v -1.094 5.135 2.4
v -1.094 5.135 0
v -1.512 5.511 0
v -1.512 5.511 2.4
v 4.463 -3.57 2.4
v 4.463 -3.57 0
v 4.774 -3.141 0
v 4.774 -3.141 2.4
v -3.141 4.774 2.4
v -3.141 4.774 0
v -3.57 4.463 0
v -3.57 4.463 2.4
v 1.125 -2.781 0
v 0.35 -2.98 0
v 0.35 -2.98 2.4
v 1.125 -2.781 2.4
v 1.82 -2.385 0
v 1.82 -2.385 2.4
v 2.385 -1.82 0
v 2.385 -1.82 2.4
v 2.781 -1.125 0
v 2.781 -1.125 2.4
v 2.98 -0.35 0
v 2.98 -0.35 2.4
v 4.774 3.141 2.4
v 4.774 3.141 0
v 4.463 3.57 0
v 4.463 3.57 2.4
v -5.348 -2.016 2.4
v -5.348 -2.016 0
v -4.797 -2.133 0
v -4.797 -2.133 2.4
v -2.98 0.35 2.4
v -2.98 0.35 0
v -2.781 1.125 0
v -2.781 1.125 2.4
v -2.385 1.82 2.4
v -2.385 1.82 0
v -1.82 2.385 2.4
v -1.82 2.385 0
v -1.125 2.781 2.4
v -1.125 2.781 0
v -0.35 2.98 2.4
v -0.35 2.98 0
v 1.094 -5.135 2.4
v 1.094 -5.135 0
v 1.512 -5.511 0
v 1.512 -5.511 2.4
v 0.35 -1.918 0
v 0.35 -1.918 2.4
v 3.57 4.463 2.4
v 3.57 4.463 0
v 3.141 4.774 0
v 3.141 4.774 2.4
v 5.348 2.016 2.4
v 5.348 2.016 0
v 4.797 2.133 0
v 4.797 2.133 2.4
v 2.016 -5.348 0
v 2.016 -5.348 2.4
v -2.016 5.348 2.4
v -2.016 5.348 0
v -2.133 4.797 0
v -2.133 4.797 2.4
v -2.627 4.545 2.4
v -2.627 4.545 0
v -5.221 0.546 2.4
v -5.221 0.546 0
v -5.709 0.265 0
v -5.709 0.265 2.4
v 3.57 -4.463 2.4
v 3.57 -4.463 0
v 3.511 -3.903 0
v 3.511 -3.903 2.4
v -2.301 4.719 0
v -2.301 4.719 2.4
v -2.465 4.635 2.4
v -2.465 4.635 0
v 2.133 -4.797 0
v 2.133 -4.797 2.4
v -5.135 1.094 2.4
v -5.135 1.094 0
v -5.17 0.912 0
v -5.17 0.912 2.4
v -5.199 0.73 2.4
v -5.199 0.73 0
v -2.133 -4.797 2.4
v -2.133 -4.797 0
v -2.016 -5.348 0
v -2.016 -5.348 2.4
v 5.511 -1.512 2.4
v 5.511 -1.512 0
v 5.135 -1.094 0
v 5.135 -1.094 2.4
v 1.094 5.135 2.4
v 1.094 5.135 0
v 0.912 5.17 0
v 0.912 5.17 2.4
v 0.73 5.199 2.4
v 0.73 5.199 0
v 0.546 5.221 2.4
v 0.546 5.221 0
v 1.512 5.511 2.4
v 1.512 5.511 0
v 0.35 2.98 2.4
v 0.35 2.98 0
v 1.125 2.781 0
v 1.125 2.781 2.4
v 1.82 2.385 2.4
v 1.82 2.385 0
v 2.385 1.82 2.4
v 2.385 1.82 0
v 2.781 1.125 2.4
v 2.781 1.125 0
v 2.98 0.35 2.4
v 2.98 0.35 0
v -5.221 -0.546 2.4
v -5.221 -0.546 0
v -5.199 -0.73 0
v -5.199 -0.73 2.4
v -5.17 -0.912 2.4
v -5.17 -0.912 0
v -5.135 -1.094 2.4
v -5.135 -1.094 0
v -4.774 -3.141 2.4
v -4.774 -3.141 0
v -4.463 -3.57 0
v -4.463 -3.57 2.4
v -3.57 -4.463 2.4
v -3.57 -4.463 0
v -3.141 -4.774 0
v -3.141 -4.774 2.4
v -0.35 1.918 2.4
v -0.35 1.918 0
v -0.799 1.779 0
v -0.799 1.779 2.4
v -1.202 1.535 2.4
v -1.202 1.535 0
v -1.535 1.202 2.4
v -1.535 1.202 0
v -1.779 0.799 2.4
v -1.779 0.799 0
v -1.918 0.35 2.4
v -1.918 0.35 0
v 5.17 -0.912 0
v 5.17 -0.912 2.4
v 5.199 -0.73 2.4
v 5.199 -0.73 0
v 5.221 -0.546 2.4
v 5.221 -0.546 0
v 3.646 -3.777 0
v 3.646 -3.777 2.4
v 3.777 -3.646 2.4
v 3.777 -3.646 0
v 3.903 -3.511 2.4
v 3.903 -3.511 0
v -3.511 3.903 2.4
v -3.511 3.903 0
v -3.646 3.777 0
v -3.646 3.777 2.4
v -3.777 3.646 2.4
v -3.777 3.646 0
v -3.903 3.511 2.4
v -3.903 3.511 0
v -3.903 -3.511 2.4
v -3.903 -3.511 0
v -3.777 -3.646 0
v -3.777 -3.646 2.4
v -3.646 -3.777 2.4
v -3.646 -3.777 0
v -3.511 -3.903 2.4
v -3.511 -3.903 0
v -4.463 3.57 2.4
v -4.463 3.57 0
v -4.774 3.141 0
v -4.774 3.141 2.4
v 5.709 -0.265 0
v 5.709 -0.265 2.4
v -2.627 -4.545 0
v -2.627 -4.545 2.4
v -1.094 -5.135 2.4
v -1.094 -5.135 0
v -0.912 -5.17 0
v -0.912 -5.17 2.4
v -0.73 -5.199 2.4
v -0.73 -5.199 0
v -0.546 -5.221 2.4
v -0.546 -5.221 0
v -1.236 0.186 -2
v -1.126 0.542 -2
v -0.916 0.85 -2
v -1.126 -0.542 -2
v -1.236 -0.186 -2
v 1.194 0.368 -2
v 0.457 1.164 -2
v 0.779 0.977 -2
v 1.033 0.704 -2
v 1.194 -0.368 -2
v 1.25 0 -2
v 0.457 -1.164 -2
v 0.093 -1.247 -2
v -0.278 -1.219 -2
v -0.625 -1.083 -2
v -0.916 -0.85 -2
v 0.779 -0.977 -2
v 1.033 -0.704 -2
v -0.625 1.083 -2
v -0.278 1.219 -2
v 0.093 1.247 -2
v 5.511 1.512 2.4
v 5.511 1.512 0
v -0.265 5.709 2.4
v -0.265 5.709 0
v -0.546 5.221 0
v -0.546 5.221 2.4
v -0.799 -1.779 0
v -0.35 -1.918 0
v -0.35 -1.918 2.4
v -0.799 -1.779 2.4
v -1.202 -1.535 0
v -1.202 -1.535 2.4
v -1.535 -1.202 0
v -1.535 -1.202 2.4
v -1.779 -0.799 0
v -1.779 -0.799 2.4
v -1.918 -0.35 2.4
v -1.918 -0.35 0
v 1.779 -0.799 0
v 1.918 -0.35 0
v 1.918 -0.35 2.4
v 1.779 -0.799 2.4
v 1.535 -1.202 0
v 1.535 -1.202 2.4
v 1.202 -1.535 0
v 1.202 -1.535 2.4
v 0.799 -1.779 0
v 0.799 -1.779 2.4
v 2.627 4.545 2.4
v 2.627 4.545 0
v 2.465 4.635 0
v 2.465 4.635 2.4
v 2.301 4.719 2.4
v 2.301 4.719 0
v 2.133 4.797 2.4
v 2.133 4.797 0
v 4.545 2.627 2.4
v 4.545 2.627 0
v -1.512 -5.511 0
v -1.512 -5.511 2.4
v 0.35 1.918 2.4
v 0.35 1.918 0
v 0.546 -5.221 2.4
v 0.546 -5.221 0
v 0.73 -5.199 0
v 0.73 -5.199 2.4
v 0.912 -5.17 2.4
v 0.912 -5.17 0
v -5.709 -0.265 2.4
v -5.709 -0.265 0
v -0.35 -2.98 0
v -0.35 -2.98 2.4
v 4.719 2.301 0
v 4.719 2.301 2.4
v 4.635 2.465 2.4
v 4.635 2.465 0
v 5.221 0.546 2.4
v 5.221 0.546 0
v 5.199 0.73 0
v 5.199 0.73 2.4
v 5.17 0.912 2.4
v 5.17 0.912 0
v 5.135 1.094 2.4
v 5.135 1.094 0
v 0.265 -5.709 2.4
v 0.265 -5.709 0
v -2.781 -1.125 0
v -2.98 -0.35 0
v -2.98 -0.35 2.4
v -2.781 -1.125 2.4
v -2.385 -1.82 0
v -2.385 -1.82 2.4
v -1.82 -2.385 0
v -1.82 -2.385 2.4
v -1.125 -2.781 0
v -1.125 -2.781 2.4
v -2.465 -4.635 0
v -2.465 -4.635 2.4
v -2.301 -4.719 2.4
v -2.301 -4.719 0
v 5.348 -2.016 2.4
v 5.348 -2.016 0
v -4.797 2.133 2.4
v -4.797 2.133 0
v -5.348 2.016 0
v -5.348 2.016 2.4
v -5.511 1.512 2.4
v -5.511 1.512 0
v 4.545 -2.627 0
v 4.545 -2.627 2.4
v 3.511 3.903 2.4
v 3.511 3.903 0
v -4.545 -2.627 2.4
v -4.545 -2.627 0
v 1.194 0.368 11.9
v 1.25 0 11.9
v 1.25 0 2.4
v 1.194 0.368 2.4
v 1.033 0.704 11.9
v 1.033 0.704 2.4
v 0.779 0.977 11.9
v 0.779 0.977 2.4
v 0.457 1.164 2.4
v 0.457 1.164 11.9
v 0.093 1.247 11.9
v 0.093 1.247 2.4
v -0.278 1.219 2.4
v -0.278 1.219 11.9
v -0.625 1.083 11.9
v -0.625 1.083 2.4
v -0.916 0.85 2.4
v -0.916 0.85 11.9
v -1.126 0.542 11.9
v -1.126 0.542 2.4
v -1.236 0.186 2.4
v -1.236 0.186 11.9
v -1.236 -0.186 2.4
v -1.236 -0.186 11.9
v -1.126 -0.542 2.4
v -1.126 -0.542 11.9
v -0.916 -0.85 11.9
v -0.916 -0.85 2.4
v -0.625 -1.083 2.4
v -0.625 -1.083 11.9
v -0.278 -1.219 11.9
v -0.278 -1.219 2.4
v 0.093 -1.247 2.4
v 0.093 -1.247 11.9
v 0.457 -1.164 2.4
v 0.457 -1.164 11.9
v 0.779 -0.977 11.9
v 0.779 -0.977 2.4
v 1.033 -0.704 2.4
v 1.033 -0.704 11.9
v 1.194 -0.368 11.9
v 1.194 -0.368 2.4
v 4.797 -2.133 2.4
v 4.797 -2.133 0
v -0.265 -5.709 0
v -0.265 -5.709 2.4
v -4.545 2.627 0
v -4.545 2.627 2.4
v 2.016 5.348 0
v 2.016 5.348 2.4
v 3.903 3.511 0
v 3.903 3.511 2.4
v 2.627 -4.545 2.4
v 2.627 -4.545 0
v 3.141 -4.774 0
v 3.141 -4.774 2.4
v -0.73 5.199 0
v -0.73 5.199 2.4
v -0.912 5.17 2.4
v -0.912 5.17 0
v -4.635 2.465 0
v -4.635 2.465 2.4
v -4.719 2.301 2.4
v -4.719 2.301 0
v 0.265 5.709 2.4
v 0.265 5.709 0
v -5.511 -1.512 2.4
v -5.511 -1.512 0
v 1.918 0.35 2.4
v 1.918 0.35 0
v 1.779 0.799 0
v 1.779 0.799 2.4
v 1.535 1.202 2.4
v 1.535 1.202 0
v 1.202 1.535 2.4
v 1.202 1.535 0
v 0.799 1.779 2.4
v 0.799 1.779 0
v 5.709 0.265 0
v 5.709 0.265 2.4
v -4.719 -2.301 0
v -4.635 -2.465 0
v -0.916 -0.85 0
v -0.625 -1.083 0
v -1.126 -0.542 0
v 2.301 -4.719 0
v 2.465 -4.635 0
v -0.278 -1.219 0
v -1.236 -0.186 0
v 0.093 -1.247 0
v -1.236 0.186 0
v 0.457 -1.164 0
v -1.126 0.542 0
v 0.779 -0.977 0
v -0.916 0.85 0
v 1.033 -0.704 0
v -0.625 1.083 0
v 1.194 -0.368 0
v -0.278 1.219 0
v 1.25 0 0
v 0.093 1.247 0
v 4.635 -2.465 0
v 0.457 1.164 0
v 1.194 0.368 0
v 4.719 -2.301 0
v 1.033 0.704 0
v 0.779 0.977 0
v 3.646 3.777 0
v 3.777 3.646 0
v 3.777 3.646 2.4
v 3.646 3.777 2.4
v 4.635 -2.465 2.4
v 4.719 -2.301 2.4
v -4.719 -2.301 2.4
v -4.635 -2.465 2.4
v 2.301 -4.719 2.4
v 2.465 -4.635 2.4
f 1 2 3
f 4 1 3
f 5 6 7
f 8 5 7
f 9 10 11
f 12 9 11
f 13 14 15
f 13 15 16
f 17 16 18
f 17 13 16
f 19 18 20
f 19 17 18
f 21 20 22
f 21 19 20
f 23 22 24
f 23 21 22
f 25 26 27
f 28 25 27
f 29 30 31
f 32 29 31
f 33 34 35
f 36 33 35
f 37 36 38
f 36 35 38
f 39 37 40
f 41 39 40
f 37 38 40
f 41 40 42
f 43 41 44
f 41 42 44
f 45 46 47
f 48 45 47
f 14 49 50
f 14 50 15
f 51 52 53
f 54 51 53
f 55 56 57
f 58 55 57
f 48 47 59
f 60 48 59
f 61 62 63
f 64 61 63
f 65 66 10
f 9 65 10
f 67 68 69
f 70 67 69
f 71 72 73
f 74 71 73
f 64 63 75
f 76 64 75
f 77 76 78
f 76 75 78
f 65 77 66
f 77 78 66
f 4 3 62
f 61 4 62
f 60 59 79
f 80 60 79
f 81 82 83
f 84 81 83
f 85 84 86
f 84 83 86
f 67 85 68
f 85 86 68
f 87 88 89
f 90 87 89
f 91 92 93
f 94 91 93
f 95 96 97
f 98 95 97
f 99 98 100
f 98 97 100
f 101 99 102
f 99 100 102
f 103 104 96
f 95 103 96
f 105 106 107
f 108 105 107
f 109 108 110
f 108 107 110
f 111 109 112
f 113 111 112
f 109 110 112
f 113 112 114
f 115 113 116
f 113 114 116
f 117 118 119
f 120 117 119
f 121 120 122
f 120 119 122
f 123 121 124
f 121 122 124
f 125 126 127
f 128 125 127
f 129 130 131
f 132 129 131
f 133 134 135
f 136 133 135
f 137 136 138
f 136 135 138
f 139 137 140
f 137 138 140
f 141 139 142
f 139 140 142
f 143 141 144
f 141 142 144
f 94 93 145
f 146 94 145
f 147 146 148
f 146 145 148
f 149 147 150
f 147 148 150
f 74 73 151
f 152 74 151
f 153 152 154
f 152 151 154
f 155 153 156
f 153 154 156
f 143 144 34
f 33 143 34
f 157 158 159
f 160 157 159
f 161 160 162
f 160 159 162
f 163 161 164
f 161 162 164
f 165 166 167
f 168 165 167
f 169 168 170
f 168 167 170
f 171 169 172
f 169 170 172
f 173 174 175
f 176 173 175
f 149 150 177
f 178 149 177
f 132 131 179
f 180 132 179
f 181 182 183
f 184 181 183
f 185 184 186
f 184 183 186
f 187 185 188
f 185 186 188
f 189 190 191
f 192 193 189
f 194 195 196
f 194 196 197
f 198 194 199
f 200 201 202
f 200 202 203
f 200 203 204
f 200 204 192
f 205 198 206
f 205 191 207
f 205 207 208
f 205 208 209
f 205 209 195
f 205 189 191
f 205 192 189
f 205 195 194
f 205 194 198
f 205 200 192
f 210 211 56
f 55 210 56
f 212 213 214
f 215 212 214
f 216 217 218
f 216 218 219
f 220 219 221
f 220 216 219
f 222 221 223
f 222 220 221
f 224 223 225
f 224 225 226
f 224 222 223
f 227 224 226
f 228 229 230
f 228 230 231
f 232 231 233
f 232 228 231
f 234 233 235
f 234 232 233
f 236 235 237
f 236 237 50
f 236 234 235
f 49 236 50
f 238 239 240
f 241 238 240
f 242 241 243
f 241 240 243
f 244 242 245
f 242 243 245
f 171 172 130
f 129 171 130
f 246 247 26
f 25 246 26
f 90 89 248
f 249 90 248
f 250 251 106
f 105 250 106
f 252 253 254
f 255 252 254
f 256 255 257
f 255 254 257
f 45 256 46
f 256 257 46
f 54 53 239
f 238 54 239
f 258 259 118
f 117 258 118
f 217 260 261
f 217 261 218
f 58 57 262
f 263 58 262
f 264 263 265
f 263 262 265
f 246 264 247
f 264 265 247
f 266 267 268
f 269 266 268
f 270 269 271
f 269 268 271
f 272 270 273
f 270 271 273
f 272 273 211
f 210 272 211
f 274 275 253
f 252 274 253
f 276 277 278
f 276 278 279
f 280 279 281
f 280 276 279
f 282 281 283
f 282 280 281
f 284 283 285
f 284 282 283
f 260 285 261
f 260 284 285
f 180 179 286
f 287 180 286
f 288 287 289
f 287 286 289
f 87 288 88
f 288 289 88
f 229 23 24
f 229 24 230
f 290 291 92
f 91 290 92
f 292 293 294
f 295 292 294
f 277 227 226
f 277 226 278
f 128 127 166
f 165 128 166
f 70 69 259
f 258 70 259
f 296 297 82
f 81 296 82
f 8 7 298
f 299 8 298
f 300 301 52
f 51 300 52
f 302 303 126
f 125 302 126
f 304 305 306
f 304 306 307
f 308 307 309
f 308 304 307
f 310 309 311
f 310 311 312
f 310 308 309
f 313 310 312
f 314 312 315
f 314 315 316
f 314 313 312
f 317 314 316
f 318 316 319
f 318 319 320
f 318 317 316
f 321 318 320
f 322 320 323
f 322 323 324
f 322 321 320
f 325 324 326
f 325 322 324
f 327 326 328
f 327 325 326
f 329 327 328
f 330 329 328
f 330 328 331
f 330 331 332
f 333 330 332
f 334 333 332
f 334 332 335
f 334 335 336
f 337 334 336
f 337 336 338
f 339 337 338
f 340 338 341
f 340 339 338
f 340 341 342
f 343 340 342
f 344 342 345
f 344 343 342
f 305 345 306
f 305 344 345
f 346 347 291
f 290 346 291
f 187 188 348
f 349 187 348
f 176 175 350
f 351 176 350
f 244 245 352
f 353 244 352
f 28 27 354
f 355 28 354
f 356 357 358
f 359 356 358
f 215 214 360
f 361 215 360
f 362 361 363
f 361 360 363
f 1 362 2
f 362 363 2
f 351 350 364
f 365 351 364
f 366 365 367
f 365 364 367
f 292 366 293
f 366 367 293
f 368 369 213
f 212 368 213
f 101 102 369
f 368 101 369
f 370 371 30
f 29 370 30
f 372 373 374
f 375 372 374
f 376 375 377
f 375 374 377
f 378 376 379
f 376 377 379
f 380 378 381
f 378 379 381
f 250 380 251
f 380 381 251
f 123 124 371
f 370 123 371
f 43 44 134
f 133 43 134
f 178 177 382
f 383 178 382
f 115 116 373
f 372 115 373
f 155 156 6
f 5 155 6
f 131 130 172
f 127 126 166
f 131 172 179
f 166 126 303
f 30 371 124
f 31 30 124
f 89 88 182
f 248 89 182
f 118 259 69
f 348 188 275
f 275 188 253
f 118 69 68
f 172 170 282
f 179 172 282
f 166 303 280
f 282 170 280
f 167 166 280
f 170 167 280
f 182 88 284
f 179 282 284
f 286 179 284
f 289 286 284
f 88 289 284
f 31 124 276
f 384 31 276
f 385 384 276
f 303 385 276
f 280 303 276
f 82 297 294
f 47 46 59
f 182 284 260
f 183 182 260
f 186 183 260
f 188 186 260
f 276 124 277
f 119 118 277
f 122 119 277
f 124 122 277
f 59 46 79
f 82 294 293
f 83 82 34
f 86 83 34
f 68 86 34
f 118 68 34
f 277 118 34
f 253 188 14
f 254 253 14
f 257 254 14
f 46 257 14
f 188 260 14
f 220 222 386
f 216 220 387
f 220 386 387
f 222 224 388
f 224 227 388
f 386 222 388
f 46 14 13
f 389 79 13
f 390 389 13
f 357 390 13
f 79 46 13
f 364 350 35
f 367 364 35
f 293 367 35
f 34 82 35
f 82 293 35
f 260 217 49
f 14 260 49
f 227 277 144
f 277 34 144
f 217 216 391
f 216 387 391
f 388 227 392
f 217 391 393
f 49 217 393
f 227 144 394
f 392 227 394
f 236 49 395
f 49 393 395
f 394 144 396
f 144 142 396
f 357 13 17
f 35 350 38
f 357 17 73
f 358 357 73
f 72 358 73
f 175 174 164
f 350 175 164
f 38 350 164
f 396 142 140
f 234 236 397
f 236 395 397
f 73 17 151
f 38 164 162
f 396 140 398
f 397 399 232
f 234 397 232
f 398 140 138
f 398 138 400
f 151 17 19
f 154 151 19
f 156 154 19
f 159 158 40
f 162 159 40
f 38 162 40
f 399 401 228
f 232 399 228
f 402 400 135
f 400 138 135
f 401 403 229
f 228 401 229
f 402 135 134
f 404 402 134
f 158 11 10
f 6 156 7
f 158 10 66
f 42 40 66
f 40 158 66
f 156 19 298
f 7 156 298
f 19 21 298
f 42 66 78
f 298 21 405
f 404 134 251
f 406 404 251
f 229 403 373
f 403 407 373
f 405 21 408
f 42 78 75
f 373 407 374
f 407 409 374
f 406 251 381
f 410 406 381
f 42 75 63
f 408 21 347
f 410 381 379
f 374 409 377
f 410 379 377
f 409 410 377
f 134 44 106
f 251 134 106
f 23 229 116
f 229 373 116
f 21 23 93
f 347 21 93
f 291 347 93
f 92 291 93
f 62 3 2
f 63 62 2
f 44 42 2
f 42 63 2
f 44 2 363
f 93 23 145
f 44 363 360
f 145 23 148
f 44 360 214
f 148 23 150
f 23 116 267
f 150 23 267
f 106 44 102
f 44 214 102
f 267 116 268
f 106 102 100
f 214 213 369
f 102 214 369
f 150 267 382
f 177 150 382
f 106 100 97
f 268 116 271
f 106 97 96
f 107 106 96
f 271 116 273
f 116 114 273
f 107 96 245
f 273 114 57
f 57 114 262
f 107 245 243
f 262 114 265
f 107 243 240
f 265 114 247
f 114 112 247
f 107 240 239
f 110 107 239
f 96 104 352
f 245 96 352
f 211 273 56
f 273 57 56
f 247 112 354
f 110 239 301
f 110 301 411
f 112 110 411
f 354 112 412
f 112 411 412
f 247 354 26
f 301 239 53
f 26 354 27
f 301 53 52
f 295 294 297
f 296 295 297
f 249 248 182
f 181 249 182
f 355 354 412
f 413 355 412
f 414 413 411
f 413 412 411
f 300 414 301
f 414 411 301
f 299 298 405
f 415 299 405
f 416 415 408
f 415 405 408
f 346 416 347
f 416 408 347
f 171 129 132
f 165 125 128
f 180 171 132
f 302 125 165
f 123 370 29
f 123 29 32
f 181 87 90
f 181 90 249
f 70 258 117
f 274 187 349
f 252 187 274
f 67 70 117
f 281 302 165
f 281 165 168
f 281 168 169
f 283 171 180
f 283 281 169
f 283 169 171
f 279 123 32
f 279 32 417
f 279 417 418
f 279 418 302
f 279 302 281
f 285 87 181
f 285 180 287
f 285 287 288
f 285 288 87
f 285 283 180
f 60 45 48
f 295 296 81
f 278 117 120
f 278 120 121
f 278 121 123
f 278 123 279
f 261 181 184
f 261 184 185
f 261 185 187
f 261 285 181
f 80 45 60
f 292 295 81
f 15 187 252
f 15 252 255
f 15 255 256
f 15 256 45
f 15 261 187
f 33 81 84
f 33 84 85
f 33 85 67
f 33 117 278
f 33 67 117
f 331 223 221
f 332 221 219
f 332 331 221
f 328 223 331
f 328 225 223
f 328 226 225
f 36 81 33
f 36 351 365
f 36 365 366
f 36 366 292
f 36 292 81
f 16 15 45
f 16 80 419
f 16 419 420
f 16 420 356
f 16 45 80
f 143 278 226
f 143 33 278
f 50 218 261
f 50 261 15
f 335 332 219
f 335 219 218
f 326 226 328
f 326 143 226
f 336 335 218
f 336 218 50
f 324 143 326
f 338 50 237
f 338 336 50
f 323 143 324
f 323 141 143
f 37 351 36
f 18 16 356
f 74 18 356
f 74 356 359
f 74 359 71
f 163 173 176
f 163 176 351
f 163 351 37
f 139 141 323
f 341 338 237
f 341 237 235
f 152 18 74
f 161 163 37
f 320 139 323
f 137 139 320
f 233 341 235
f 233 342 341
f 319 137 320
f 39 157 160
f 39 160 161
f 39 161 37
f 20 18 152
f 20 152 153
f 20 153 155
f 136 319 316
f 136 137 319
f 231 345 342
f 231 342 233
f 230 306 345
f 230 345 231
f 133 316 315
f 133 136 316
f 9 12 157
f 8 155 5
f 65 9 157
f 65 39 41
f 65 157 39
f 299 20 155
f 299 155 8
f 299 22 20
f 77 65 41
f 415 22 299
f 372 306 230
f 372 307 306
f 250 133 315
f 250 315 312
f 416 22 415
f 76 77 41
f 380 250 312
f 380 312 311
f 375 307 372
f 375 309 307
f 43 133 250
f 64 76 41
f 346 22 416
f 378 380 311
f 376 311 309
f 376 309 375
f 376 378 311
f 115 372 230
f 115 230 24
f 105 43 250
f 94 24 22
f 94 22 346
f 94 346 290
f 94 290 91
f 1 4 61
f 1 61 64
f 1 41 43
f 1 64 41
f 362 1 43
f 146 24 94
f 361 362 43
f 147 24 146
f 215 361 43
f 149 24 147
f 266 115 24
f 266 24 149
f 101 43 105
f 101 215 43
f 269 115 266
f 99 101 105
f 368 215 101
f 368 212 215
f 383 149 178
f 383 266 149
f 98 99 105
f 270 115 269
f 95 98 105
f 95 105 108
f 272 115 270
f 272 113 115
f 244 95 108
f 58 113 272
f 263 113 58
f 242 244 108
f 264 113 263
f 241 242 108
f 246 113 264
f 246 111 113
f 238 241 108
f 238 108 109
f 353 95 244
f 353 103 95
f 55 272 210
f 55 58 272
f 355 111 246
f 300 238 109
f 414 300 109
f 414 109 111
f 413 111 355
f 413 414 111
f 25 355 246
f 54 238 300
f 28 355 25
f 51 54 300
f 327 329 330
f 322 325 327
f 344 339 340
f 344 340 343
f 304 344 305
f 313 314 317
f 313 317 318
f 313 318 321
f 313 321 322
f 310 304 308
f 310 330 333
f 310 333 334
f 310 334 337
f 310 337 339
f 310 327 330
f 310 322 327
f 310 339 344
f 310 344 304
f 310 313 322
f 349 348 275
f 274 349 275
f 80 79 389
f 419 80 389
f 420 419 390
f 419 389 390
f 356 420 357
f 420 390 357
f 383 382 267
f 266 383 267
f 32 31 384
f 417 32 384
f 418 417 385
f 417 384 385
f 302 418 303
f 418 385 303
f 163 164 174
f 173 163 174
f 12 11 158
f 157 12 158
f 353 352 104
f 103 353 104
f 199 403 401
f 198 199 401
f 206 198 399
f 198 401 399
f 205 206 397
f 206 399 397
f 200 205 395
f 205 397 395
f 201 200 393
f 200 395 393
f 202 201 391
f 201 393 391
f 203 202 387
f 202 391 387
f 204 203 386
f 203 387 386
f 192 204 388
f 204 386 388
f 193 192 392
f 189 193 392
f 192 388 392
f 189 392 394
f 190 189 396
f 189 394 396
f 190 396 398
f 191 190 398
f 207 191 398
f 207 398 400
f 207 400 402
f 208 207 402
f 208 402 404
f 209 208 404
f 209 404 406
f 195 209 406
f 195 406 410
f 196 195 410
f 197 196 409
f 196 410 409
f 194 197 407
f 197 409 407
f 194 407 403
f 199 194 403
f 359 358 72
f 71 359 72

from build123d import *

# Parameters (mm, degrees)
DODANIE_WYCI_GNI_CIE2_DEPTH = 2.4
SZKIC2_R                    = 1.25
DODANIE_WYCI_GNI_CIE3_DEPTH = 2
DODANIE_WYCI_GNI_CIE4_START = 9.5
SZKIC3_R                    = 1.25
DODANIE_WYCI_GNI_CIE4_DEPTH = 9.5
WYTNIJ_WYCI_GNI_CIE1_DEPTH  = 9.5


with BuildPart() as part:
    # Szkic1 → Dodanie-wyciągnięcie2 (new body)
    with BuildSketch(Plane.XY):
        with BuildLine():
            Line((2.133245608, 4.797057762), (2.016205978, 5.347685932))
            Line((2.016205978, 5.347685932), (1.512146024, 5.511464939))
            Line((1.512146024, 5.511464939), (1.093807857, 5.134791561))
            ThreePointArc((1.093807857, 5.134791561), (0.821280941, 5.185363788), (0.546464765, 5.22148219))
            Line((0.546464765, 5.22148219), (0.265, 5.708993464))
            Line((0.265, 5.708993464), (-0.265, 5.708993464))
            Line((-0.265, 5.708993464), (-0.546464765, 5.22148219))
            ThreePointArc((-0.546464765, 5.22148219), (-0.821280941, 5.185363788), (-1.093807857, 5.134791561))
            Line((-1.093807857, 5.134791561), (-1.512146024, 5.511464939))
            Line((-1.512146024, 5.511464939), (-2.016205978, 5.347685932))
            Line((-2.016205978, 5.347685932), (-2.133245608, 4.797057762))
            ThreePointArc((-2.133245608, 4.797057762), (-2.383450124, 4.677784252), (-2.627010944, 4.545471757))
            Line((-2.627010944, 4.545471757), (-3.14127266, 4.774435825))
            Line((-3.14127266, 4.774435825), (-3.570051667, 4.462909641))
            Line((-3.570051667, 4.462909641), (-3.511209508, 3.903063898))
            ThreePointArc((-3.511209508, 3.903063898), (-3.712310601, 3.712310601), (-3.903063898, 3.511209508))
            Line((-3.903063898, 3.511209508), (-4.462909641, 3.570051667))
            Line((-4.462909641, 3.570051667), (-4.774435825, 3.14127266))
            Line((-4.774435825, 3.14127266), (-4.545471757, 2.627010944))
            ThreePointArc((-4.545471757, 2.627010944), (-4.677784252, 2.383450124), (-4.797057762, 2.133245608))
            Line((-4.797057762, 2.133245608), (-5.347685932, 2.016205978))
            Line((-5.347685932, 2.016205978), (-5.511464939, 1.512146024))
            Line((-5.511464939, 1.512146024), (-5.134791561, 1.093807857))
            ThreePointArc((-5.134791561, 1.093807857), (-5.185363788, 0.821280941), (-5.22148219, 0.546464765))
            Line((-5.22148219, 0.546464765), (-5.708993464, 0.265))
            Line((-5.708993464, 0.265), (-5.708993464, -0.265))
            Line((-5.708993464, -0.265), (-5.22148219, -0.546464765))
            ThreePointArc((-5.22148219, -0.546464765), (-5.185363788, -0.821280941), (-5.134791561, -1.093807857))
            Line((-5.134791561, -1.093807857), (-5.511464939, -1.512146024))
            Line((-5.511464939, -1.512146024), (-5.347685932, -2.016205978))
            Line((-5.347685932, -2.016205978), (-4.797057762, -2.133245608))
            ThreePointArc((-4.797057762, -2.133245608), (-4.677784252, -2.383450124), (-4.545471757, -2.627010944))
            Line((-4.545471757, -2.627010944), (-4.774435825, -3.14127266))
            Line((-4.774435825, -3.14127266), (-4.462909641, -3.570051667))
            Line((-4.462909641, -3.570051667), (-3.903063898, -3.511209508))
            ThreePointArc((-3.903063898, -3.511209508), (-3.712310601, -3.712310601), (-3.511209508, -3.903063898))
            Line((-3.511209508, -3.903063898), (-3.570051667, -4.462909641))
            Line((-3.570051667, -4.462909641), (-3.14127266, -4.774435825))
            Line((-3.14127266, -4.774435825), (-2.627010944, -4.545471757))
            ThreePointArc((-2.627010944, -4.545471757), (-2.383450124, -4.677784252), (-2.133245608, -4.797057762))
            Line((-2.133245608, -4.797057762), (-2.016205978, -5.347685932))
            Line((-2.016205978, -5.347685932), (-1.512146024, -5.511464939))
            Line((-1.512146024, -5.511464939), (-1.093807857, -5.134791561))
            ThreePointArc((-1.093807857, -5.134791561), (-0.821280941, -5.185363788), (-0.546464765, -5.22148219))
            Line((-0.546464765, -5.22148219), (-0.265, -5.708993464))
            Line((-0.265, -5.708993464), (0.265, -5.708993464))
            Line((0.265, -5.708993464), (0.546464765, -5.22148219))
            ThreePointArc((0.546464765, -5.22148219), (0.821280941, -5.185363788), (1.093807857, -5.134791561))
            Line((1.093807857, -5.134791561), (1.512146024, -5.511464939))
            Line((1.512146024, -5.511464939), (2.016205978, -5.347685932))
            Line((2.016205978, -5.347685932), (2.133245608, -4.797057762))
            ThreePointArc((2.133245608, -4.797057762), (2.383450124, -4.677784252), (2.627010944, -4.545471757))
            Line((2.627010944, -4.545471757), (3.14127266, -4.774435825))
            Line((3.14127266, -4.774435825), (3.570051667, -4.462909641))
            Line((3.570051667, -4.462909641), (3.511209508, -3.903063898))
            ThreePointArc((3.511209508, -3.903063898), (3.712310601, -3.712310601), (3.903063898, -3.511209508))
            Line((3.903063898, -3.511209508), (4.462909641, -3.570051667))
            Line((4.462909641, -3.570051667), (4.774435825, -3.14127266))
            Line((4.774435825, -3.14127266), (4.545471757, -2.627010944))
            ThreePointArc((4.545471757, -2.627010944), (4.677784252, -2.383450124), (4.797057762, -2.133245608))
            Line((4.797057762, -2.133245608), (5.347685932, -2.016205978))
            Line((5.347685932, -2.016205978), (5.511464939, -1.512146024))
            Line((5.511464939, -1.512146024), (5.134791561, -1.093807857))
            ThreePointArc((5.134791561, -1.093807857), (5.185363788, -0.821280941), (5.22148219, -0.546464765))
            Line((5.22148219, -0.546464765), (5.708993464, -0.265))
            Line((5.708993464, -0.265), (5.708993464, 0.265))
            Line((5.708993464, 0.265), (5.22148219, 0.546464765))
            ThreePointArc((5.22148219, 0.546464765), (5.185363788, 0.821280941), (5.134791561, 1.093807857))
            Line((5.134791561, 1.093807857), (5.511464939, 1.512146024))
            Line((5.511464939, 1.512146024), (5.347685932, 2.016205978))
            Line((5.347685932, 2.016205978), (4.797057762, 2.133245608))
            ThreePointArc((4.797057762, 2.133245608), (4.677784252, 2.383450124), (4.545471757, 2.627010944))
            Line((4.545471757, 2.627010944), (4.774435825, 3.14127266))
            Line((4.774435825, 3.14127266), (4.462909641, 3.570051667))
            Line((4.462909641, 3.570051667), (3.903063898, 3.511209508))
            ThreePointArc((3.903063898, 3.511209508), (3.712310601, 3.712310601), (3.511209508, 3.903063898))
            Line((3.511209508, 3.903063898), (3.570051667, 4.462909641))
            Line((3.570051667, 4.462909641), (3.14127266, 4.774435825))
            Line((3.14127266, 4.774435825), (2.627010944, 4.545471757))
            ThreePointArc((2.627010944, 4.545471757), (2.383450124, 4.677784252), (2.133245608, 4.797057762))
        make_face()
    extrude(amount=DODANIE_WYCI_GNI_CIE2_DEPTH)

    # Szkic2 → Dodanie-wyciągnięcie3 (add)
    with BuildSketch(Plane(origin=(0, 0, 0), x_dir=(-1, 0, 0), z_dir=(0, 0, -1))):
        with Locations(Location((0, 0, 0), (0, 0, 180))):
            Circle(SZKIC2_R)
    extrude(amount=DODANIE_WYCI_GNI_CIE3_DEPTH)

    # Szkic3 → Dodanie-wyciągnięcie4 (add)
    with BuildSketch(Plane.XY.offset(2.4).offset(DODANIE_WYCI_GNI_CIE4_START)):
        Circle(SZKIC3_R)
    extrude(amount=-DODANIE_WYCI_GNI_CIE4_DEPTH)

    # Szkic4 → Wytnij-wyciągnięcie1 (cut)
    with BuildSketch(Plane(origin=(0, 0, 0), x_dir=(-1, 0, 0), z_dir=(0, 0, -1))):
        with BuildLine():
            Line((-2.979513383, 0.35), (-1.918332609, 0.35))
            ThreePointArc((-1.918332609, 0.35), (-1.378858223, 1.378858223), (-0.35, 1.918332609))
            Line((-0.35, 1.918332609), (-0.35, 2.979513383))
            ThreePointArc((-0.35, 2.979513383), (-2.121320344, 2.121320344), (-2.979513383, 0.35))
        make_face()
        with BuildLine():
            Line((-2.979513383, -0.35), (-1.918332609, -0.35))
            ThreePointArc((-1.918332609, -0.35), (-1.378858223, -1.378858223), (-0.35, -1.918332609))
            Line((-0.35, -1.918332609), (-0.35, -2.979513383))
            ThreePointArc((-0.35, -2.979513383), (-2.121320344, -2.121320344), (-2.979513383, -0.35))
        make_face()
        with BuildLine():
            Line((1.918332609, 0.35), (2.979513383, 0.35))
            ThreePointArc((2.979513383, 0.35), (2.121320344, 2.121320344), (0.35, 2.979513383))
            Line((0.35, 2.979513383), (0.35, 1.918332609))
            ThreePointArc((0.35, 1.918332609), (1.378858223, 1.378858223), (1.918332609, 0.35))
        make_face()
        with BuildLine():
            Line((1.918332609, -0.35), (2.979513383, -0.35))
            ThreePointArc((2.979513383, -0.35), (2.121320344, -2.121320344), (0.35, -2.979513383))
            Line((0.35, -2.979513383), (0.35, -1.918332609))
            ThreePointArc((0.35, -1.918332609), (1.378858223, -1.378858223), (1.918332609, -0.35))
        make_face()
    extrude(amount=-WYTNIJ_WYCI_GNI_CIE1_DEPTH, mode=Mode.SUBTRACT)


solid = part.part
